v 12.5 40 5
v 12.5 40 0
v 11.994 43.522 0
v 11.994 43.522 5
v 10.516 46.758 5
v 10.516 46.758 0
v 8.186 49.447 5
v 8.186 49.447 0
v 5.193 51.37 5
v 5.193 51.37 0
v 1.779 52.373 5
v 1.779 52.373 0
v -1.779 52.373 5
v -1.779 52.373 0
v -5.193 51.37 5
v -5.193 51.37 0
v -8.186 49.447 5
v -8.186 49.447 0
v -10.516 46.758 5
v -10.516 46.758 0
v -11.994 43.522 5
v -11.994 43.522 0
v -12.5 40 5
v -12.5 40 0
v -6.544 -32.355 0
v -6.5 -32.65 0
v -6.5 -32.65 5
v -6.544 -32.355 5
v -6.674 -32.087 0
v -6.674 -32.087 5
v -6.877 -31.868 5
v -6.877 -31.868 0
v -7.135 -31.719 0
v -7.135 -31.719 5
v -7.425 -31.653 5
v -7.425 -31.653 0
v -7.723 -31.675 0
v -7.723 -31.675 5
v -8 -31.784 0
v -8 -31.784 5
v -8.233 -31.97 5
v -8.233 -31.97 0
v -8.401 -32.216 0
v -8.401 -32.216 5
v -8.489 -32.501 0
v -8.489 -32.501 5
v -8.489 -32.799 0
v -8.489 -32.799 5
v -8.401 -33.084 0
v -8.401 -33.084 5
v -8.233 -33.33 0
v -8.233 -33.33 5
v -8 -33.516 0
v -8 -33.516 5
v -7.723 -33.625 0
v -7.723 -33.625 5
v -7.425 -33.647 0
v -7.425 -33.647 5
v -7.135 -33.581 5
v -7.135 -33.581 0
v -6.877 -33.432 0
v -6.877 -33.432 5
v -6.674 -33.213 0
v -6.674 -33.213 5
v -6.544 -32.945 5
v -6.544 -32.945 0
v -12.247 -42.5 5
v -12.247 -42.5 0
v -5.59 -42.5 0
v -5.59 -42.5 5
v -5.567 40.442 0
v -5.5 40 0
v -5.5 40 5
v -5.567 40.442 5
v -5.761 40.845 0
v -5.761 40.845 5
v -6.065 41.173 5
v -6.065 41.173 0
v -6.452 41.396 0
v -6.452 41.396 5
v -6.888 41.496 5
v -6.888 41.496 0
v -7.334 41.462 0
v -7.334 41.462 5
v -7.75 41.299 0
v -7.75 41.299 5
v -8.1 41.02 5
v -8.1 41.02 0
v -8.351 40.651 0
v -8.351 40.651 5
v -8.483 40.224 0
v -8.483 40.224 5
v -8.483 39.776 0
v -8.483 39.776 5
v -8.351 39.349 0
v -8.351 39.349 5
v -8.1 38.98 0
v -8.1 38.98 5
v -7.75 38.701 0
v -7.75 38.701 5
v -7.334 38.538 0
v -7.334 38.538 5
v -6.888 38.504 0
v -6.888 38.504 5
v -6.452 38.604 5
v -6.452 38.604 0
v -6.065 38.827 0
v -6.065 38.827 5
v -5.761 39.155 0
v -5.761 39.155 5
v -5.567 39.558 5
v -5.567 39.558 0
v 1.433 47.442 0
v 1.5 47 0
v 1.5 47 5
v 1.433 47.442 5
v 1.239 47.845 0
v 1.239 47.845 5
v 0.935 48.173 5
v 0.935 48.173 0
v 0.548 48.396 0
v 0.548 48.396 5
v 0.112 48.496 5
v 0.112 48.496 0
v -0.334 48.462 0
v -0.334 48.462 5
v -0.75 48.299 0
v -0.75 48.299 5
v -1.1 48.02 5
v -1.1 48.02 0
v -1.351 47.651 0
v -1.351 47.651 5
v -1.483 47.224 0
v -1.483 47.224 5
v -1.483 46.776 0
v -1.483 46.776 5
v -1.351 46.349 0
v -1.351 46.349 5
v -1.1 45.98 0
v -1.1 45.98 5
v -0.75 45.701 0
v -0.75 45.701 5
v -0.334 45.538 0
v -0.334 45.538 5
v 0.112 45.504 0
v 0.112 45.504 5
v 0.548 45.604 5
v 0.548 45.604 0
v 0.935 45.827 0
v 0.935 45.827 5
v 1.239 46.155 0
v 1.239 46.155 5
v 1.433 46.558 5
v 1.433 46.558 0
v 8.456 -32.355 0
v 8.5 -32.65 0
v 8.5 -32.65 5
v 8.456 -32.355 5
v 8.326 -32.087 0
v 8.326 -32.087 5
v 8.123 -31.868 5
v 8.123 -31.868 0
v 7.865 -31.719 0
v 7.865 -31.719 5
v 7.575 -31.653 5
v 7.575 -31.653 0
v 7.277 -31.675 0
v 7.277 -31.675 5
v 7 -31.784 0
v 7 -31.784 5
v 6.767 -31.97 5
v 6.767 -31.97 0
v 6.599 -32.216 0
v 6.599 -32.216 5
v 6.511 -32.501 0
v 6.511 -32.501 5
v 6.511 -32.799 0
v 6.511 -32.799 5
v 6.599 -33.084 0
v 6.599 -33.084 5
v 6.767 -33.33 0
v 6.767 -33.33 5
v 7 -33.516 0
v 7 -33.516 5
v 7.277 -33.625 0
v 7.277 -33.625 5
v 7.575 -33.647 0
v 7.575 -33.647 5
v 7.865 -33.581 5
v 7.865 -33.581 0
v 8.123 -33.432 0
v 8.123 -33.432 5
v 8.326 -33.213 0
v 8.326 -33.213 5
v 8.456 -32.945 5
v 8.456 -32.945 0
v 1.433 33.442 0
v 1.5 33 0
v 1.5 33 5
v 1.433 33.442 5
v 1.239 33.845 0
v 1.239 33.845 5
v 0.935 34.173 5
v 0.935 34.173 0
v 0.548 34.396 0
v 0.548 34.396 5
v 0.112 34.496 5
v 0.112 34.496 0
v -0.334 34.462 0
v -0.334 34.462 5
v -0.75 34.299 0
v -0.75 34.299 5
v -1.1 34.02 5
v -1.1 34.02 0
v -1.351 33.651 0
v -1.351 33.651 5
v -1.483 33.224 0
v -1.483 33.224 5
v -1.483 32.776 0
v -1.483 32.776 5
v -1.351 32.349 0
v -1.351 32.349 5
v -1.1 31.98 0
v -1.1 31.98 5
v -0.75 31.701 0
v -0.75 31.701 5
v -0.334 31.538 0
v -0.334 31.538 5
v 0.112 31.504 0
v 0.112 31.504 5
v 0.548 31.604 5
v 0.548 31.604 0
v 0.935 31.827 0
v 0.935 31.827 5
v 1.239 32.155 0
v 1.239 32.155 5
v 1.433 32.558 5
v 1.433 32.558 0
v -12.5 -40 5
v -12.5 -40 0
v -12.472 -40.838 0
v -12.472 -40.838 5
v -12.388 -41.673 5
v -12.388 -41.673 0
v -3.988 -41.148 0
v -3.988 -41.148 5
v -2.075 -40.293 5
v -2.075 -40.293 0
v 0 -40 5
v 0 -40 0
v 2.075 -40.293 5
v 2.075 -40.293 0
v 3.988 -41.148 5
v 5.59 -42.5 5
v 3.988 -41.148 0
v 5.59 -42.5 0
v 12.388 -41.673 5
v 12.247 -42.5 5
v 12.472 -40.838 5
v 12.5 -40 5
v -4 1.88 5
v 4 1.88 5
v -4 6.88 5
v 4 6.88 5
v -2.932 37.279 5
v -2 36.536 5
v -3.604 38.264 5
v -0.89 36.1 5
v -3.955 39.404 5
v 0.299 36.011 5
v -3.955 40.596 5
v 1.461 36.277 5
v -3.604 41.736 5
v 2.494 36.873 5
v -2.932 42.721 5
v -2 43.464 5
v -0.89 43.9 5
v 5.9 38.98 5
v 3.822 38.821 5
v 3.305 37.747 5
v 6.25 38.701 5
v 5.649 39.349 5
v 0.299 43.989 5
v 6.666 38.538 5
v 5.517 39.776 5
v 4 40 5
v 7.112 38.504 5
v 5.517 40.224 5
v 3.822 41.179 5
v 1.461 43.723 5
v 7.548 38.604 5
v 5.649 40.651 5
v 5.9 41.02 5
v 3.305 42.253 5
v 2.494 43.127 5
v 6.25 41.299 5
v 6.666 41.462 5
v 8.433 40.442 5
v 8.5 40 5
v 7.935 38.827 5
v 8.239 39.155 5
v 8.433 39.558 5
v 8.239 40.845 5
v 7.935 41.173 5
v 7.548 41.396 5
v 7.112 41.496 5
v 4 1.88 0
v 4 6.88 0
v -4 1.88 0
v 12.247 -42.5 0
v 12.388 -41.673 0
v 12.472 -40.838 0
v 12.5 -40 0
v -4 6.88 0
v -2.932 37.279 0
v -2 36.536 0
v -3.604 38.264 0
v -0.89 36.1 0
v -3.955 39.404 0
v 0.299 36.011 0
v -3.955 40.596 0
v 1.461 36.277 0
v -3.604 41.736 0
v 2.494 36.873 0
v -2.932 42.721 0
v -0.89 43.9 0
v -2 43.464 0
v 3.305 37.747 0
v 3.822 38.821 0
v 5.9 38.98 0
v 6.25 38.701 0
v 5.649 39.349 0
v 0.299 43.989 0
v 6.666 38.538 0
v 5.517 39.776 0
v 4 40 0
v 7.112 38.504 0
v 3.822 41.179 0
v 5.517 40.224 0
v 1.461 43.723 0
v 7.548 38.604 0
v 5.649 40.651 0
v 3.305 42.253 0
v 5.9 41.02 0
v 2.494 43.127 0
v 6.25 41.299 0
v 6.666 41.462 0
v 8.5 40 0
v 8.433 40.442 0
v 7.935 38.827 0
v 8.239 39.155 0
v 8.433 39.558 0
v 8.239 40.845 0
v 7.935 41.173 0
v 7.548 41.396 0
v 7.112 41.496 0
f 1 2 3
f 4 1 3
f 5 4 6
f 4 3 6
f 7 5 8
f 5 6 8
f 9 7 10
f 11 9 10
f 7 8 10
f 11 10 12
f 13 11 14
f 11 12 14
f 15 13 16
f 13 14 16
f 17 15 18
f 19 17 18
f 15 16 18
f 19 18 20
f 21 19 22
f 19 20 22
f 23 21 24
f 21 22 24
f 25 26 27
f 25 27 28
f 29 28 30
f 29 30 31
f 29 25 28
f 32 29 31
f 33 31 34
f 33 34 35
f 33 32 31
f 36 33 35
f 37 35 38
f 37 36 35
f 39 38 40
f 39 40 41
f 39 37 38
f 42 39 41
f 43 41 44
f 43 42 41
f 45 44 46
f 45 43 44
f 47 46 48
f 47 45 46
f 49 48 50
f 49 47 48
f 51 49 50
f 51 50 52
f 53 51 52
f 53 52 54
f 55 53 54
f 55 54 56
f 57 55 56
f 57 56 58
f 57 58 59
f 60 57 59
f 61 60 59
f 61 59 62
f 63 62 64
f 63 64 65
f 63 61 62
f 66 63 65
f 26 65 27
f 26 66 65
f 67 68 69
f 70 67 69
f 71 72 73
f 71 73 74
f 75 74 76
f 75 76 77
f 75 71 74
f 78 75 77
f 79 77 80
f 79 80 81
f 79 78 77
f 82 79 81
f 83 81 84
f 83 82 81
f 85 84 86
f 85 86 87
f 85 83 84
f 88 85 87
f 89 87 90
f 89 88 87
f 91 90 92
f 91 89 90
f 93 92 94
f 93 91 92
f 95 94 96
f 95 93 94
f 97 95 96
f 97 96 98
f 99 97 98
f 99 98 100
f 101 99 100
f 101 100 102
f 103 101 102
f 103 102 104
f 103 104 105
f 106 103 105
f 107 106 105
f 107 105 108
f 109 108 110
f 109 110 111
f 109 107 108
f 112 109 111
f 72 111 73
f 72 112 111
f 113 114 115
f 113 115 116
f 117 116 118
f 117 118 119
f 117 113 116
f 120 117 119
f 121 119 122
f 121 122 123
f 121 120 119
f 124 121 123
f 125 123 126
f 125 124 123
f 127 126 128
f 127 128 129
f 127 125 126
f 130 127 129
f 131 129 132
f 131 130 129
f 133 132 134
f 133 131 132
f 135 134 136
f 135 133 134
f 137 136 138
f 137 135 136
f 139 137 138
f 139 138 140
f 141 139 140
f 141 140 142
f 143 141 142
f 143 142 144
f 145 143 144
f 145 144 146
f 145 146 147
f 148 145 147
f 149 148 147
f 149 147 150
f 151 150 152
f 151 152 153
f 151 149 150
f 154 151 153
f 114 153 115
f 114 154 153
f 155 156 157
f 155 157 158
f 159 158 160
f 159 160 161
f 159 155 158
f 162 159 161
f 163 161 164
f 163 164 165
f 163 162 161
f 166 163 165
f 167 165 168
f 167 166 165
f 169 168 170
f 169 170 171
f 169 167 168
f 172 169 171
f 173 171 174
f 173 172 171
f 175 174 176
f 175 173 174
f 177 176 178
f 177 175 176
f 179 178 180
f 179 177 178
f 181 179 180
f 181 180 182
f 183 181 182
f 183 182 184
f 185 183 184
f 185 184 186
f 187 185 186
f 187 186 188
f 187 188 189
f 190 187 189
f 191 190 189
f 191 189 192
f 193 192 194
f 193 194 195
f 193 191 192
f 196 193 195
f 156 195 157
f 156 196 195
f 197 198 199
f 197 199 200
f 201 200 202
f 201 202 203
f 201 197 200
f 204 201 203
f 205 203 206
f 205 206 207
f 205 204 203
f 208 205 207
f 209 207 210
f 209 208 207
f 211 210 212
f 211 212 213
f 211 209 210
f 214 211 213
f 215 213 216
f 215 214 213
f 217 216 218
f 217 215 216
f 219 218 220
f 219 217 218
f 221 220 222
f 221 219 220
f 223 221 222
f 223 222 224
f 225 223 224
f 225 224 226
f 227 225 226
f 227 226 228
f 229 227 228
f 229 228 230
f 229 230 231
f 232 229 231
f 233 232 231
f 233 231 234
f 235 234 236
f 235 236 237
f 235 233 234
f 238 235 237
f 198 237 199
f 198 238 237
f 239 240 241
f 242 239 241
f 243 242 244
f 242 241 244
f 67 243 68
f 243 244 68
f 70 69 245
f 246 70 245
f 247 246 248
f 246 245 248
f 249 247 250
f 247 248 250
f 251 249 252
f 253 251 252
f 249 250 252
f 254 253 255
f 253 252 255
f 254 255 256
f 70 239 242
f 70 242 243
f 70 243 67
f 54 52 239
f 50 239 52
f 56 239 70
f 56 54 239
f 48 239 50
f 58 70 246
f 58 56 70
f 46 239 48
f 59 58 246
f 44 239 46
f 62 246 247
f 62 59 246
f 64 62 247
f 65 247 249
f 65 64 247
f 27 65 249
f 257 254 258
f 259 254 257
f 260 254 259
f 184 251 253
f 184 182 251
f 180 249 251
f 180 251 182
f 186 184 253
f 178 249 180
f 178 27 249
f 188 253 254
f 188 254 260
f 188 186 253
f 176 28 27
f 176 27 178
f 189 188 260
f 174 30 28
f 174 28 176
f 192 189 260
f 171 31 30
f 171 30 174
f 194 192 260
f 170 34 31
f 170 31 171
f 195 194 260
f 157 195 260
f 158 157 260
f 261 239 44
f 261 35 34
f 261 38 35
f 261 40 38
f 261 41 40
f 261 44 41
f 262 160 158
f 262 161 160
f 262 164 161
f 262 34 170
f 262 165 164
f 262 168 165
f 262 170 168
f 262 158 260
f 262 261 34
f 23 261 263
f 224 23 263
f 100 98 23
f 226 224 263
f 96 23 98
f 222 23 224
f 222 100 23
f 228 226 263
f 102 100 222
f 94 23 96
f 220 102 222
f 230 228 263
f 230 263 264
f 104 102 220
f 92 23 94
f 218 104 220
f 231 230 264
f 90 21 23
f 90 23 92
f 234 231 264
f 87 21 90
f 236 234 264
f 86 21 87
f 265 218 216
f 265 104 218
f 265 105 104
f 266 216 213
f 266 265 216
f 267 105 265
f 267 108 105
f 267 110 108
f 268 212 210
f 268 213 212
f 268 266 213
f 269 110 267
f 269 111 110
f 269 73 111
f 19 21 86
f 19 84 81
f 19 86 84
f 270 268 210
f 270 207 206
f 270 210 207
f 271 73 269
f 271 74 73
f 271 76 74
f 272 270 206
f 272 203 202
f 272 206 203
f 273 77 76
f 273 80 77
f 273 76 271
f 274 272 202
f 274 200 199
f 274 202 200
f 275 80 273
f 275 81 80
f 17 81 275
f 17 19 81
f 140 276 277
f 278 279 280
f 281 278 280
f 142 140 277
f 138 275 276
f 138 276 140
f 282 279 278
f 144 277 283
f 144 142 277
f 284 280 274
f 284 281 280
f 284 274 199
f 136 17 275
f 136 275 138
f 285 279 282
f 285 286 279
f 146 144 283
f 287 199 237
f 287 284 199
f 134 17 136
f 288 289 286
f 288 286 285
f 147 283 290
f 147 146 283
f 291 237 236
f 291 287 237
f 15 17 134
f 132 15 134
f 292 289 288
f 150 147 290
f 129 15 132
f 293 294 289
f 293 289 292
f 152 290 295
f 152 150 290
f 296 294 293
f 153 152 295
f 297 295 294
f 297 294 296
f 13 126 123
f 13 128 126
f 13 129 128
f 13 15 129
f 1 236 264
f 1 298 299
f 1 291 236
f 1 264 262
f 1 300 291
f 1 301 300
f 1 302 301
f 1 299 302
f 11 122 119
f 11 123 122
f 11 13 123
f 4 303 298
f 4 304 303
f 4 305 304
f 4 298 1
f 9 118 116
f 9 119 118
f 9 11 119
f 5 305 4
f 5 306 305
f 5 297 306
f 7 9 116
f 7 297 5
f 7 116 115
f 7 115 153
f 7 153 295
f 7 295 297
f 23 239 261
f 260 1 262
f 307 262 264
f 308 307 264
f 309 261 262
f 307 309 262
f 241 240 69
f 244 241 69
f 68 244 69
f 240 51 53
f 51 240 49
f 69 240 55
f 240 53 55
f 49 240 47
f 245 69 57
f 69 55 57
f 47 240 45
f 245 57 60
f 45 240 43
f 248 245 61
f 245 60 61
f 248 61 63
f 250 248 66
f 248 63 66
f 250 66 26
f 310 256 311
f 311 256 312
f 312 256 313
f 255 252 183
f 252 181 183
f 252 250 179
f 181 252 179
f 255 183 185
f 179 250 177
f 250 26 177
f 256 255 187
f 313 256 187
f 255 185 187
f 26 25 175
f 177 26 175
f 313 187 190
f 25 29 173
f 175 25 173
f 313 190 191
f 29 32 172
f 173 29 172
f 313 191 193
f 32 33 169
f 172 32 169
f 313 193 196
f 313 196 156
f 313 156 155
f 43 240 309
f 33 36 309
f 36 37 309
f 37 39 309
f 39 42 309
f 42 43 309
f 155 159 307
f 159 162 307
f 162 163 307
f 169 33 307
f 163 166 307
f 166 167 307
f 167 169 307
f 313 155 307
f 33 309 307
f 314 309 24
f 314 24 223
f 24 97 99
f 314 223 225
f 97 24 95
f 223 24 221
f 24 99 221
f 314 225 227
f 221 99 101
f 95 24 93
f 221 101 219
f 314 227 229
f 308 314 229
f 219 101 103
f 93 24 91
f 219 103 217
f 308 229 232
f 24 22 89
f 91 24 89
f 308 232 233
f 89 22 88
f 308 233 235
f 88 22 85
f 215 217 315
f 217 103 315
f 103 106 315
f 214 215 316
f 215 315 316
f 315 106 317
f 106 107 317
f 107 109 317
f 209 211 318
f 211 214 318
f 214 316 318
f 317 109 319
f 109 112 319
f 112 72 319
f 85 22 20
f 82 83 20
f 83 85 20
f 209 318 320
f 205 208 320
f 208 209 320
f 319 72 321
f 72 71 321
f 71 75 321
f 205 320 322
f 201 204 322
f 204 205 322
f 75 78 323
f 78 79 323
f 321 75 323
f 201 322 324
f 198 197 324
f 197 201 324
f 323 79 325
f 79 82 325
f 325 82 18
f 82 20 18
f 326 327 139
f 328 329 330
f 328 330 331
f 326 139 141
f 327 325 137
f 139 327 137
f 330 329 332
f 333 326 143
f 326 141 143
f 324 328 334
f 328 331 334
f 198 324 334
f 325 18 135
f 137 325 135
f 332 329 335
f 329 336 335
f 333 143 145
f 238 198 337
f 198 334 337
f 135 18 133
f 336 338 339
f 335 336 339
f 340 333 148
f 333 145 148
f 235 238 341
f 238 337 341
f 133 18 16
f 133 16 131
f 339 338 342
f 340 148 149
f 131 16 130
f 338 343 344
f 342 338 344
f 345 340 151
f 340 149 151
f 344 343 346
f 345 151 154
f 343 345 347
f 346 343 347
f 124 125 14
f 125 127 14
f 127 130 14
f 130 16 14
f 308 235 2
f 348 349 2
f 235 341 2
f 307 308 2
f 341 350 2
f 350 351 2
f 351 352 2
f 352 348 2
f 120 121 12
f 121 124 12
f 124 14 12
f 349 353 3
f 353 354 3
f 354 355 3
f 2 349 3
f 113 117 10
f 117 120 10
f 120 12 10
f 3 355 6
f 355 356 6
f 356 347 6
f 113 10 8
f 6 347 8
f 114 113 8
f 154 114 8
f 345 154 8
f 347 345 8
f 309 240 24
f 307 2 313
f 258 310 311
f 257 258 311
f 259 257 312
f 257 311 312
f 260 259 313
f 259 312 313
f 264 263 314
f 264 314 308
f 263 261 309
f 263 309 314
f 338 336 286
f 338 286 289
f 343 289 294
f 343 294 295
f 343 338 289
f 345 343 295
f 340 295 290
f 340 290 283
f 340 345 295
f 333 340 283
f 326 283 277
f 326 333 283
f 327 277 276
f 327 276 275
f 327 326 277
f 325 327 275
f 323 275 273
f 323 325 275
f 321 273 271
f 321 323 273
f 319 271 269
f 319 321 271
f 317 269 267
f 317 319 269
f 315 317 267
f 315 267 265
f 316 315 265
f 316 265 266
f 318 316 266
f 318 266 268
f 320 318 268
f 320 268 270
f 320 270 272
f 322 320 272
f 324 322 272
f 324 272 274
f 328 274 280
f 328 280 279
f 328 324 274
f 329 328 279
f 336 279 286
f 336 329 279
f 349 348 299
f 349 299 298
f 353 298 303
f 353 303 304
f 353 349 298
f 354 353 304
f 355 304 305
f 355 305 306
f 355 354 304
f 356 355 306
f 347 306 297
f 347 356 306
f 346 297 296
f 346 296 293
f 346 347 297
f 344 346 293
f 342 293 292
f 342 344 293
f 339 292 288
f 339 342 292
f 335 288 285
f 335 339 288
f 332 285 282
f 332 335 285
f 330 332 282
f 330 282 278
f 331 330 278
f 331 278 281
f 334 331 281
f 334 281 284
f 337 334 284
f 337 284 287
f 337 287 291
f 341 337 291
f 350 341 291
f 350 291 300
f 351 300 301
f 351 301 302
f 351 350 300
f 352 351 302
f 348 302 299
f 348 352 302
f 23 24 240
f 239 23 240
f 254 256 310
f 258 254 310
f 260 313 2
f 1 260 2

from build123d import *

# Parameters (mm, degrees)
SKETCH1_R           = 1
SKETCH1_R_2         = 1.5
SKETCH1_R_3         = 4
BOSS_EXTRUDE2_DEPTH = 5
SKETCH2_W           = 8
SKETCH2_H           = 5
CUT_EXTRUDE1_DEPTH  = 10


with BuildPart() as part:
    # Sketch1 → Boss-Extrude2 (new body)
    with BuildSketch(Plane.XY):
        with BuildLine():
            Line((-12.5, 40), (-12.5, -40))
            ThreePointArc((-12.5, -40), (-12.436701913, -41.256362025), (-12.247448714, -42.5))
            Line((-12.247448714, -42.5), (-5.590169944, -42.5))
            ThreePointArc((-5.590169944, -42.5), (0, -40), (5.590169944, -42.5))
            Line((5.590169944, -42.5), (12.247448714, -42.5))
            ThreePointArc((12.247448714, -42.5), (12.436701913, -41.256362025), (12.5, -40))
            Line((12.5, -40), (12.5, 40))
            ThreePointArc((12.5, 40), (0, 52.5), (-12.5, 40))
        make_face()
        with Locations((-7.5, -32.65)):
            Circle(SKETCH1_R, mode=Mode.SUBTRACT)
        with Locations((7.5, -32.65)):
            Circle(SKETCH1_R, mode=Mode.SUBTRACT)
        with Locations((-7, 40)):
            Circle(SKETCH1_R_2, mode=Mode.SUBTRACT)
        with Locations((0, 40)):
            Circle(SKETCH1_R_3, mode=Mode.SUBTRACT)
        with Locations((0, 33)):
            Circle(SKETCH1_R_2, mode=Mode.SUBTRACT)
        with Locations((0, 47)):
            Circle(SKETCH1_R_2, mode=Mode.SUBTRACT)
        with Locations((7, 40)):
            Circle(SKETCH1_R_2, mode=Mode.SUBTRACT)
    extrude(amount=BOSS_EXTRUDE2_DEPTH)

    # Sketch2 → Cut-Extrude1 (cut)
    with BuildSketch(Plane.XY.offset(6)):
        with Locations((0, 4.38)):
            Rectangle(SKETCH2_W, SKETCH2_H)
    extrude(amount=-CUT_EXTRUDE1_DEPTH, mode=Mode.SUBTRACT)


solid = part.part
